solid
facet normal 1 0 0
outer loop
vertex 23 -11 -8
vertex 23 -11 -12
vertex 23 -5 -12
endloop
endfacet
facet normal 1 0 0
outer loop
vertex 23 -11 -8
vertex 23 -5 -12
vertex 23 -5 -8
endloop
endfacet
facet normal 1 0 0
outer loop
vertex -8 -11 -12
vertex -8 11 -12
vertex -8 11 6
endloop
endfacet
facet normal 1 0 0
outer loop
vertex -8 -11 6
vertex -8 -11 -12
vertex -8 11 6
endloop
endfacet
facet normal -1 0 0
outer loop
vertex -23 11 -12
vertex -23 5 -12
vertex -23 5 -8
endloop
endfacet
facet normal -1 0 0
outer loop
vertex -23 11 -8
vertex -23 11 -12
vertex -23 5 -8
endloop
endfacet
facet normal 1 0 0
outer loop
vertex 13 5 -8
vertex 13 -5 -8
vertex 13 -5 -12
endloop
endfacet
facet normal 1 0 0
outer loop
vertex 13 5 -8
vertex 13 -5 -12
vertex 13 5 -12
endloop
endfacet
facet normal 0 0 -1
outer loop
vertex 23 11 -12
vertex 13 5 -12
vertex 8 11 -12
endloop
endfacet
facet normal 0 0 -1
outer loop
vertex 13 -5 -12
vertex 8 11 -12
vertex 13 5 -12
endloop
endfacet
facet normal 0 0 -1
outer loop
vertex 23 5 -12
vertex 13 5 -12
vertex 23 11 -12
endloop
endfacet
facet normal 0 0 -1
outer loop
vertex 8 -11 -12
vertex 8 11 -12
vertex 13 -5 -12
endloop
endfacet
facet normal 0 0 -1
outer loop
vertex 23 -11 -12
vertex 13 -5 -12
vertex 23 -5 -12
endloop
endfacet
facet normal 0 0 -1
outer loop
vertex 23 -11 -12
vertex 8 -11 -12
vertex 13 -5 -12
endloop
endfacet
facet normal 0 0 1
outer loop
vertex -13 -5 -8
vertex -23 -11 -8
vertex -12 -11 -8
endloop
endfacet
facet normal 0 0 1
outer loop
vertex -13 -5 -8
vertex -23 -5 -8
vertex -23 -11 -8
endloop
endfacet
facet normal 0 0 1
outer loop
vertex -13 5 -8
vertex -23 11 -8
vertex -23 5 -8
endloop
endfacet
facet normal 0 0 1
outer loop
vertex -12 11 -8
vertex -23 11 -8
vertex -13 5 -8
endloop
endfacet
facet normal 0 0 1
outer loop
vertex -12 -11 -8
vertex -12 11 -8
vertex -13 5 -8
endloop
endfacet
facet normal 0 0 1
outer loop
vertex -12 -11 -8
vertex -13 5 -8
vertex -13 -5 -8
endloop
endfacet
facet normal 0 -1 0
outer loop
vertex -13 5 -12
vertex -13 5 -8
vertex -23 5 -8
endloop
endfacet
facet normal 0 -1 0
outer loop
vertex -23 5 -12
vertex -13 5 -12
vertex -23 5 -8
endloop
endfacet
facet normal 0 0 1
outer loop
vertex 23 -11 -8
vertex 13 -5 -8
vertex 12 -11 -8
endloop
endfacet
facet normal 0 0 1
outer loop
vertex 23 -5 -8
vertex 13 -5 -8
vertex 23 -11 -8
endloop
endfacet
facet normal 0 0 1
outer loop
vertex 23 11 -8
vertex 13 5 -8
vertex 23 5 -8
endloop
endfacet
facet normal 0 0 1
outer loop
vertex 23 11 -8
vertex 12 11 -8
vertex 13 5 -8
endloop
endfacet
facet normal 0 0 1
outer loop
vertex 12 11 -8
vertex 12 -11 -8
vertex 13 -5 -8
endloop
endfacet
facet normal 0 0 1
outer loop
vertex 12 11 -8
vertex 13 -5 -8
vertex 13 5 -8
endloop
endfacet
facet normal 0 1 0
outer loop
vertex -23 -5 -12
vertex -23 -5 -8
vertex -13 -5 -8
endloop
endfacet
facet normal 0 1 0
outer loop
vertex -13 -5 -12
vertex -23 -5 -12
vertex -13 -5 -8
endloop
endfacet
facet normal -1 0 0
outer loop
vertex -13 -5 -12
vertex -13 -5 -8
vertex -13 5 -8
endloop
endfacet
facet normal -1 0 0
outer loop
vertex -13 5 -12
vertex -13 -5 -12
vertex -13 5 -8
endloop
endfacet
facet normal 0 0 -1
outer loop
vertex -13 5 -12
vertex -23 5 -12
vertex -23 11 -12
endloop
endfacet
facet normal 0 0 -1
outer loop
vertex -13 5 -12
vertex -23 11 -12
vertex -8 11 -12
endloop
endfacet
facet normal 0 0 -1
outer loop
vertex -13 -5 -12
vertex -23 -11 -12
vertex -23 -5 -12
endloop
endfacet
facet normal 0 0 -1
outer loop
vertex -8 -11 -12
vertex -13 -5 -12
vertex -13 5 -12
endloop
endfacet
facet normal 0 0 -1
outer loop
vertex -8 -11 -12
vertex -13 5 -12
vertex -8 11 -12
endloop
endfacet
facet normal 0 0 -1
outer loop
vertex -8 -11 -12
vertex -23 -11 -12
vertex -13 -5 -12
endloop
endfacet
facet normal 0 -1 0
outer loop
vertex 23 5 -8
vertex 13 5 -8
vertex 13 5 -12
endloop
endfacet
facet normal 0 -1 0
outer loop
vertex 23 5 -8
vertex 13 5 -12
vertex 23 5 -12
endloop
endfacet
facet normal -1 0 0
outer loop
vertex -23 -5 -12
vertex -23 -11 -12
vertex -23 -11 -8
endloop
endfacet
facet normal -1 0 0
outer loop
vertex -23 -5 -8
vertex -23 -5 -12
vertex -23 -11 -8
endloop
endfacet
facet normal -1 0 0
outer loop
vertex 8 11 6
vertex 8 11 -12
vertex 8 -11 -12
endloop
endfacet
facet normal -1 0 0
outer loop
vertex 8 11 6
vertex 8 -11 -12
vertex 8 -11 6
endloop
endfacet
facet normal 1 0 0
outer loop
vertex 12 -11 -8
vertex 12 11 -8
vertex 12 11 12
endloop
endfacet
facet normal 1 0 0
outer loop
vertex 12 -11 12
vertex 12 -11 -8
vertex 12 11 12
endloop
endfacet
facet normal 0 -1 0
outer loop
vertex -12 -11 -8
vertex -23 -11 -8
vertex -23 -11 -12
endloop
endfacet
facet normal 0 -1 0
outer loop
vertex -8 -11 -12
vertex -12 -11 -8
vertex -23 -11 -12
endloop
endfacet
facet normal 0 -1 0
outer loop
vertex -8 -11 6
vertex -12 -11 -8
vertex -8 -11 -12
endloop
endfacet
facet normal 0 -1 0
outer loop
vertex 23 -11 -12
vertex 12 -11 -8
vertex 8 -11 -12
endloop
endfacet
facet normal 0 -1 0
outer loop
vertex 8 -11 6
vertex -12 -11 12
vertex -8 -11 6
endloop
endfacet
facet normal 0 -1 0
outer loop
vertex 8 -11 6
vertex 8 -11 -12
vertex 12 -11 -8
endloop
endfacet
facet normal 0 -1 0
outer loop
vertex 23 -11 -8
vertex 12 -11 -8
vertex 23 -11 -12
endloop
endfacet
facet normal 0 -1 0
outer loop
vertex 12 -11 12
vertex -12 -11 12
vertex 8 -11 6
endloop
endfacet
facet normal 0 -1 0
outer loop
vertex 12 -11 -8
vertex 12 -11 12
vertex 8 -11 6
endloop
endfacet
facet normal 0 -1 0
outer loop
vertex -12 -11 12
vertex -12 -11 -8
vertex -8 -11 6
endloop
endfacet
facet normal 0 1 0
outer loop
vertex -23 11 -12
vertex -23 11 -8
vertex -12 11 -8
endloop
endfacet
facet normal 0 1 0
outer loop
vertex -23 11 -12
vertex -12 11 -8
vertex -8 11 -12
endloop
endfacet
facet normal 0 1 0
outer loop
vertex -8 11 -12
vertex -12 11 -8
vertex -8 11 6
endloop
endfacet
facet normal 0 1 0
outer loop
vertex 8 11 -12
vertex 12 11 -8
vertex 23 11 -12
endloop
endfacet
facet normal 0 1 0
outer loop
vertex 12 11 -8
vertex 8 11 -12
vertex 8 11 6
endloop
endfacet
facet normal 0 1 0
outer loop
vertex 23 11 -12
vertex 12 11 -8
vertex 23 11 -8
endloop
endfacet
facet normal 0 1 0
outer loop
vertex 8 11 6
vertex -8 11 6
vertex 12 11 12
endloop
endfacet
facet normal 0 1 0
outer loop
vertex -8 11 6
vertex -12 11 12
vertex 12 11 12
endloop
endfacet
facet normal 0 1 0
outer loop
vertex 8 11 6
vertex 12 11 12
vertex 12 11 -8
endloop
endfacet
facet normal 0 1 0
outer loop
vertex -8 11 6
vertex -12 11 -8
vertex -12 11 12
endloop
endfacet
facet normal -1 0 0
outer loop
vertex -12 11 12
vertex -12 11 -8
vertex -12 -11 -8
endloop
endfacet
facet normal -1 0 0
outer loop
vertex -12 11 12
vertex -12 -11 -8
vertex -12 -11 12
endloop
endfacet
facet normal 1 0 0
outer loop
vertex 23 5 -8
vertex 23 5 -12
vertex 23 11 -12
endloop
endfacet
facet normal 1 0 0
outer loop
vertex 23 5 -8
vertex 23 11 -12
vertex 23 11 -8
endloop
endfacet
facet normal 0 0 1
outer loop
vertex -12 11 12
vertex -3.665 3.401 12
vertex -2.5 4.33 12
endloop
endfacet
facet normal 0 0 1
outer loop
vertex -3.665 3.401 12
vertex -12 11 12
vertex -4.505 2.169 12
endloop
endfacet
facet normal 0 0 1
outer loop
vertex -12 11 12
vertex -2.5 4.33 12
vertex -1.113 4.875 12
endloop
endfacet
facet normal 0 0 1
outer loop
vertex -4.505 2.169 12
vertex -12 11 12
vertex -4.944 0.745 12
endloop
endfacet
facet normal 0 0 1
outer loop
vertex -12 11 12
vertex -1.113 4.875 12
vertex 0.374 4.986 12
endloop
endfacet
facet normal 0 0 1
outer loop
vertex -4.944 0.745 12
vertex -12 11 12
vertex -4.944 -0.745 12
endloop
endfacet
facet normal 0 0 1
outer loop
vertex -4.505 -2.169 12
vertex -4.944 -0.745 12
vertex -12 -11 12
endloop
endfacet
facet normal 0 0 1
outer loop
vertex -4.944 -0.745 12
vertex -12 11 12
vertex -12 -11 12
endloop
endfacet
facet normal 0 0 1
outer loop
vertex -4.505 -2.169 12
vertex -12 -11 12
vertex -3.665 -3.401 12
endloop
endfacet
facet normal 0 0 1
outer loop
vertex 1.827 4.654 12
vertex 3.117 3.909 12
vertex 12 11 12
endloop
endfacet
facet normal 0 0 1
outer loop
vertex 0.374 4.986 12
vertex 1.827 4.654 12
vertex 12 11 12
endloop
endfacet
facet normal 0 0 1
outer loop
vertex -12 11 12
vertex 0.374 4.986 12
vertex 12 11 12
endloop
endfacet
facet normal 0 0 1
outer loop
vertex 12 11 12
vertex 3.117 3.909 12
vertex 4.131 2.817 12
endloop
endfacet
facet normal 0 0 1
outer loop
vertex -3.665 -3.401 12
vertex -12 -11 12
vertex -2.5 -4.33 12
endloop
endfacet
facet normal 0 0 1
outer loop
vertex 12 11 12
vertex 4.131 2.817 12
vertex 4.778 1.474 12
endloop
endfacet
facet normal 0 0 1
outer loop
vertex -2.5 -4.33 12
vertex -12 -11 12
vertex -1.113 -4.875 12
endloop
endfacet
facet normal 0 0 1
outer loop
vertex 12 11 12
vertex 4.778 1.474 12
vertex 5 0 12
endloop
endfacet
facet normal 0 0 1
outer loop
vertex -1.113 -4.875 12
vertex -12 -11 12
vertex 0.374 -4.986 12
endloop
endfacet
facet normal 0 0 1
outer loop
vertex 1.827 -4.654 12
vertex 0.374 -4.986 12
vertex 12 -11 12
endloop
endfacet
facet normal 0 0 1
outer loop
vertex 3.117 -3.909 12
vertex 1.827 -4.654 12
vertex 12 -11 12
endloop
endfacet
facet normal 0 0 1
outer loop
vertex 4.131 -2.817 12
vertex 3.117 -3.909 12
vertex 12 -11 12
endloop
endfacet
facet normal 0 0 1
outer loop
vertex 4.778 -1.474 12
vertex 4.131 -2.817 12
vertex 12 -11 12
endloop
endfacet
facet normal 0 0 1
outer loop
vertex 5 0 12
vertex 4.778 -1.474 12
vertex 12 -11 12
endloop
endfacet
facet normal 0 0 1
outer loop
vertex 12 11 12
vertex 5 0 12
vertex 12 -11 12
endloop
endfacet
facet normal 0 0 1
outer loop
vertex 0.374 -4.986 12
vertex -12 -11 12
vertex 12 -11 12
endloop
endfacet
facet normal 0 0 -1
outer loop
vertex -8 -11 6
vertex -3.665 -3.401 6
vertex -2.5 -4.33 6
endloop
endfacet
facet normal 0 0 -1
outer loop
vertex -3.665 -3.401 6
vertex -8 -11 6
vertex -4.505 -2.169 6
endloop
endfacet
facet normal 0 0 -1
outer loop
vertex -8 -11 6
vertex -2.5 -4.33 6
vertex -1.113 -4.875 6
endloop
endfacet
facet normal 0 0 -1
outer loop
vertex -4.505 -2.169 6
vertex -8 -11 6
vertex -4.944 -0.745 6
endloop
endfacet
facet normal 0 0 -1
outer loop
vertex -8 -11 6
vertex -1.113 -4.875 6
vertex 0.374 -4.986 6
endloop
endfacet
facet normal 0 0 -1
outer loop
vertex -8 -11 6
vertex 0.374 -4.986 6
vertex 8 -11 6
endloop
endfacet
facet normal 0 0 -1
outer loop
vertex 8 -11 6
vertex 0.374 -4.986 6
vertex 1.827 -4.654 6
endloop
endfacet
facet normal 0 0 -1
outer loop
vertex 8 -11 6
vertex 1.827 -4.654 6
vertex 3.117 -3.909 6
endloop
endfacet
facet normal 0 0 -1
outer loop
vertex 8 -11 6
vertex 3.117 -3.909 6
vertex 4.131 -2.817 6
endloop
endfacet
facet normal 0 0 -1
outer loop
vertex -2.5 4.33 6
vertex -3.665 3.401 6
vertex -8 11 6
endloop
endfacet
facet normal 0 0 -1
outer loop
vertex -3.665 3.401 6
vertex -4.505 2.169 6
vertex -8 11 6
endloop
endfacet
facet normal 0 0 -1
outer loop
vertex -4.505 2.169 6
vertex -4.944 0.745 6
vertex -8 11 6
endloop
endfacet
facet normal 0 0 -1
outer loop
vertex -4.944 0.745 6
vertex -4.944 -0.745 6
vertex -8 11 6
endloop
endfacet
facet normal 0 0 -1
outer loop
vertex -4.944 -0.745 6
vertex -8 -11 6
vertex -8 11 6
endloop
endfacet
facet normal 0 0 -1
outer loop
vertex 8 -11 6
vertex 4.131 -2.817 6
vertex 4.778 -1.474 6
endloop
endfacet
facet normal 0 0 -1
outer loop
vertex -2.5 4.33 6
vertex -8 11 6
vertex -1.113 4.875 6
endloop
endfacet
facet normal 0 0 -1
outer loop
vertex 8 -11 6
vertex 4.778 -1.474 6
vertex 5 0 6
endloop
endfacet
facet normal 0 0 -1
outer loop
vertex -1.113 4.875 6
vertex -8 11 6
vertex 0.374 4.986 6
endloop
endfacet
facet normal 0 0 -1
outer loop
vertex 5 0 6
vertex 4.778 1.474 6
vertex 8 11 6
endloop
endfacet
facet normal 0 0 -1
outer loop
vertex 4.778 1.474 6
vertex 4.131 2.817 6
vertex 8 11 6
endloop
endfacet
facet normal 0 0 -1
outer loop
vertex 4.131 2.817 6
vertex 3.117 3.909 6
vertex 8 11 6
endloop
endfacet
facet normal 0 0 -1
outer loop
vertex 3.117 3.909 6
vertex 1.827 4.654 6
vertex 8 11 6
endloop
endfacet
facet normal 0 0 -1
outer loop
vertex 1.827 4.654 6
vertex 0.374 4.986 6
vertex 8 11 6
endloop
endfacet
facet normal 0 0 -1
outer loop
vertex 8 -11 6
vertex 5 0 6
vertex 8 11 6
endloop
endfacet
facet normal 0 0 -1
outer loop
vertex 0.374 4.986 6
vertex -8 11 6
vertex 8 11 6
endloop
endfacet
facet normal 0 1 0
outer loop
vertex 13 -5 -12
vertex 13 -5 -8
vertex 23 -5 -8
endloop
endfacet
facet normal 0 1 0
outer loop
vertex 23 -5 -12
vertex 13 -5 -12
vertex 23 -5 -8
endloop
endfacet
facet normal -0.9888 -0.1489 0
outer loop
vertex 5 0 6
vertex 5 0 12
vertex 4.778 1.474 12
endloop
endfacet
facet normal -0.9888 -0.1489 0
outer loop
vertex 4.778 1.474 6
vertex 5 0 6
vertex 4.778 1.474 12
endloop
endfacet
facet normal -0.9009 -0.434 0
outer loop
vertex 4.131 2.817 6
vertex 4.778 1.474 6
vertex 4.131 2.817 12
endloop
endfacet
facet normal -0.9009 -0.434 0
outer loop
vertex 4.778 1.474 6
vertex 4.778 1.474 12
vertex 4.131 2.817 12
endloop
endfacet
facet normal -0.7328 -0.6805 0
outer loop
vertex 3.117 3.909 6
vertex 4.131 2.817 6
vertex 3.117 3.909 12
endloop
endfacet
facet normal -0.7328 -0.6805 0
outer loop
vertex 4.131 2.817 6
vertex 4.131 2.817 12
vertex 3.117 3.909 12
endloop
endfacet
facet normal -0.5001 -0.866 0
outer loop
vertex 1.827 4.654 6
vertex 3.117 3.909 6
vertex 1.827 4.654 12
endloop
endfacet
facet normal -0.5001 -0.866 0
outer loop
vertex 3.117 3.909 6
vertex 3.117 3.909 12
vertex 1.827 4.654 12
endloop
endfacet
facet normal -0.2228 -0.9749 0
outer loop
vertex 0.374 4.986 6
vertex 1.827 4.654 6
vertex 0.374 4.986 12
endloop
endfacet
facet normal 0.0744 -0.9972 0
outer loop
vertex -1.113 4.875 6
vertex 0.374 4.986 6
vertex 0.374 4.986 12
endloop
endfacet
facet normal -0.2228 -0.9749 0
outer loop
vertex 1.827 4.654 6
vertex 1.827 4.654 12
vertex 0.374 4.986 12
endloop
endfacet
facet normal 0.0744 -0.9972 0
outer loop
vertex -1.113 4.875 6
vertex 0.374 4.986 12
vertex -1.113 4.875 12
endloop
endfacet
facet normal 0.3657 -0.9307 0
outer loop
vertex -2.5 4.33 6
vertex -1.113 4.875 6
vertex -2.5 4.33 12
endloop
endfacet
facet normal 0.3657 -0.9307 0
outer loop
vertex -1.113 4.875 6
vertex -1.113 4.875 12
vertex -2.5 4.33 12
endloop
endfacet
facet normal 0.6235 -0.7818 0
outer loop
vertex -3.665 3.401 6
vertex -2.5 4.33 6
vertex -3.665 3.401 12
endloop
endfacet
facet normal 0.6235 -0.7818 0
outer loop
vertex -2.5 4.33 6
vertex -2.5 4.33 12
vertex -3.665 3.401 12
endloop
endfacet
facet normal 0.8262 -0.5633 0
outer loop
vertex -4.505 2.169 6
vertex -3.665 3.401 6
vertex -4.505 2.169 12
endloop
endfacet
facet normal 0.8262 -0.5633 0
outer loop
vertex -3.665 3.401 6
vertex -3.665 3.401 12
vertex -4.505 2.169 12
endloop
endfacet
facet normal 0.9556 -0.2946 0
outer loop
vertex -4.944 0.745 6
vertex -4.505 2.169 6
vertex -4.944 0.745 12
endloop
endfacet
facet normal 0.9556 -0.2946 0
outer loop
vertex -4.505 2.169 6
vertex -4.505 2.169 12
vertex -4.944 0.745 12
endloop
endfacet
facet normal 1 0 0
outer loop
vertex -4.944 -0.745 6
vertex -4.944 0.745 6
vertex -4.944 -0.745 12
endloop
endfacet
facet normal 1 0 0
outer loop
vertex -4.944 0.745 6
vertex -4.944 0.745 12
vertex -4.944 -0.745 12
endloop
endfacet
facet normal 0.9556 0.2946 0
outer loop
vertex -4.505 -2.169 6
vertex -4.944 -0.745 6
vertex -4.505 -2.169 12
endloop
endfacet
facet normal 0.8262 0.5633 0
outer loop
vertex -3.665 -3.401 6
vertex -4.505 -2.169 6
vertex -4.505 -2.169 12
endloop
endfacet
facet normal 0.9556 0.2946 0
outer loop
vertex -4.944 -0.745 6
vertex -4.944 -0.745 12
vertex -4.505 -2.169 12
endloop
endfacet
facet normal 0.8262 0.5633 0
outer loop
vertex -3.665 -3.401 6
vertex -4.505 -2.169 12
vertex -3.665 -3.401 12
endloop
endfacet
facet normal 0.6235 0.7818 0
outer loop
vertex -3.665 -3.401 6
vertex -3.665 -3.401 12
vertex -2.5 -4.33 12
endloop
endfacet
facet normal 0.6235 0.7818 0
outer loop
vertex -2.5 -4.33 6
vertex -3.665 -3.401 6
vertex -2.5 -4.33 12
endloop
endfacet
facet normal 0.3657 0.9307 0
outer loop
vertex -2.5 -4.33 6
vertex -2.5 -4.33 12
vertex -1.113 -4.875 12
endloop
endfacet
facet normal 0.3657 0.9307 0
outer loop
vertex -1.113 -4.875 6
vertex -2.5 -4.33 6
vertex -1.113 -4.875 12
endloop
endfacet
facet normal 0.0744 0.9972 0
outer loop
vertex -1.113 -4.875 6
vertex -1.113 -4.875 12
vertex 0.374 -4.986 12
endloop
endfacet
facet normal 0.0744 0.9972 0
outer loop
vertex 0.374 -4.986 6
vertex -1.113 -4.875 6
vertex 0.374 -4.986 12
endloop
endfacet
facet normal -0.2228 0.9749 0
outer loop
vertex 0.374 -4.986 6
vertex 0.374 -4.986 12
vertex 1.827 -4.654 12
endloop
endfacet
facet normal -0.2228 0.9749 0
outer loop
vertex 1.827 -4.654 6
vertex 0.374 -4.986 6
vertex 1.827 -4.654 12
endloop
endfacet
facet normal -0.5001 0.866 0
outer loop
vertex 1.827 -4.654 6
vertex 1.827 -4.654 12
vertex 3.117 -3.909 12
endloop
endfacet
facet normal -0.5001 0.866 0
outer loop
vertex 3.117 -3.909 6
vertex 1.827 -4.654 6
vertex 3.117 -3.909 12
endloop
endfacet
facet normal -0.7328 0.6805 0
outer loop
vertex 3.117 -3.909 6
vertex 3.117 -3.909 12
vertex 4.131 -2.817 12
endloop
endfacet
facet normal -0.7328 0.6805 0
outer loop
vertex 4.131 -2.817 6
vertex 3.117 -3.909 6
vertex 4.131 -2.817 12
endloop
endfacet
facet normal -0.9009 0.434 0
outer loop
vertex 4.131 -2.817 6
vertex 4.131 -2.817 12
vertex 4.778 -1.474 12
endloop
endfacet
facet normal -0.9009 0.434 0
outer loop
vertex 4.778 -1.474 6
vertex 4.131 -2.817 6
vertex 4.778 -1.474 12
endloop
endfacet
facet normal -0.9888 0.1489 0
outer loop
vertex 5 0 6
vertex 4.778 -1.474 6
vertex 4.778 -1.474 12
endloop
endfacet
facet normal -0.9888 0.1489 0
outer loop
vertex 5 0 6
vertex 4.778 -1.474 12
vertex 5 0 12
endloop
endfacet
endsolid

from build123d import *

# Parameters (mm, degrees)
F0_W          = 46
F0_H          = 24
F1_DEPTH      = 11
F1_DEPTH_BACK = 11
F2_W          = 16.6977588087
F2_H          = 22
F2_W_2        = 16
F2_H_2        = 27.9069770836
F3_DEPTH      = 25
F3_DEPTH_BACK = 25
F4_W          = 10
F4_H          = 10
F4_W_2        = 13.8300365831
F4_W_3        = 3.8300365831
F5_DEPTH      = 25
F6_R          = 5
F7_DEPTH      = 10


with BuildPart() as f1:
    # F0 (on Front) → F1 (new body, two sides)
    with BuildSketch(Plane.XZ) as f1_sk:
        Rectangle(F0_W, F0_H)
    extrude(amount=F1_DEPTH)
    extrude(f1_sk.sketch, amount=-F1_DEPTH_BACK)

    # F2 (on Front) → F3 (cut, two sides)
    with BuildSketch(Plane.XZ) as f3_sk:
        with Locations((-20.3488794044, 3)):
            Rectangle(F2_W, F2_H)
        with Locations((20.3488794044, 3)):
            Rectangle(F2_W, F2_H)
        with Locations((0, -7.9534885418)):
            Rectangle(F2_W_2, F2_H_2)
    extrude(amount=-F3_DEPTH, mode=Mode.SUBTRACT)
    extrude(f3_sk.sketch, amount=F3_DEPTH_BACK, mode=Mode.SUBTRACT)

    # F4 (on face) → F5 (cut)
    with BuildSketch(Plane.XY.offset(-8)):
        with Locations((-18, 0)):
            Rectangle(F4_W, F4_H)
        with Locations((19.9150182915, 0)):
            Rectangle(F4_W_2, F4_H)
        with Locations((-24.9150182915, 0)):
            Rectangle(F4_W_3, F4_H)
    extrude(amount=-F5_DEPTH, mode=Mode.SUBTRACT)

    # F6 (on face) → F7 (cut)
    with BuildSketch(Plane.XY.offset(12)):
        Circle(F6_R)
    extrude(amount=-F7_DEPTH, mode=Mode.SUBTRACT)


solid = f1.part
